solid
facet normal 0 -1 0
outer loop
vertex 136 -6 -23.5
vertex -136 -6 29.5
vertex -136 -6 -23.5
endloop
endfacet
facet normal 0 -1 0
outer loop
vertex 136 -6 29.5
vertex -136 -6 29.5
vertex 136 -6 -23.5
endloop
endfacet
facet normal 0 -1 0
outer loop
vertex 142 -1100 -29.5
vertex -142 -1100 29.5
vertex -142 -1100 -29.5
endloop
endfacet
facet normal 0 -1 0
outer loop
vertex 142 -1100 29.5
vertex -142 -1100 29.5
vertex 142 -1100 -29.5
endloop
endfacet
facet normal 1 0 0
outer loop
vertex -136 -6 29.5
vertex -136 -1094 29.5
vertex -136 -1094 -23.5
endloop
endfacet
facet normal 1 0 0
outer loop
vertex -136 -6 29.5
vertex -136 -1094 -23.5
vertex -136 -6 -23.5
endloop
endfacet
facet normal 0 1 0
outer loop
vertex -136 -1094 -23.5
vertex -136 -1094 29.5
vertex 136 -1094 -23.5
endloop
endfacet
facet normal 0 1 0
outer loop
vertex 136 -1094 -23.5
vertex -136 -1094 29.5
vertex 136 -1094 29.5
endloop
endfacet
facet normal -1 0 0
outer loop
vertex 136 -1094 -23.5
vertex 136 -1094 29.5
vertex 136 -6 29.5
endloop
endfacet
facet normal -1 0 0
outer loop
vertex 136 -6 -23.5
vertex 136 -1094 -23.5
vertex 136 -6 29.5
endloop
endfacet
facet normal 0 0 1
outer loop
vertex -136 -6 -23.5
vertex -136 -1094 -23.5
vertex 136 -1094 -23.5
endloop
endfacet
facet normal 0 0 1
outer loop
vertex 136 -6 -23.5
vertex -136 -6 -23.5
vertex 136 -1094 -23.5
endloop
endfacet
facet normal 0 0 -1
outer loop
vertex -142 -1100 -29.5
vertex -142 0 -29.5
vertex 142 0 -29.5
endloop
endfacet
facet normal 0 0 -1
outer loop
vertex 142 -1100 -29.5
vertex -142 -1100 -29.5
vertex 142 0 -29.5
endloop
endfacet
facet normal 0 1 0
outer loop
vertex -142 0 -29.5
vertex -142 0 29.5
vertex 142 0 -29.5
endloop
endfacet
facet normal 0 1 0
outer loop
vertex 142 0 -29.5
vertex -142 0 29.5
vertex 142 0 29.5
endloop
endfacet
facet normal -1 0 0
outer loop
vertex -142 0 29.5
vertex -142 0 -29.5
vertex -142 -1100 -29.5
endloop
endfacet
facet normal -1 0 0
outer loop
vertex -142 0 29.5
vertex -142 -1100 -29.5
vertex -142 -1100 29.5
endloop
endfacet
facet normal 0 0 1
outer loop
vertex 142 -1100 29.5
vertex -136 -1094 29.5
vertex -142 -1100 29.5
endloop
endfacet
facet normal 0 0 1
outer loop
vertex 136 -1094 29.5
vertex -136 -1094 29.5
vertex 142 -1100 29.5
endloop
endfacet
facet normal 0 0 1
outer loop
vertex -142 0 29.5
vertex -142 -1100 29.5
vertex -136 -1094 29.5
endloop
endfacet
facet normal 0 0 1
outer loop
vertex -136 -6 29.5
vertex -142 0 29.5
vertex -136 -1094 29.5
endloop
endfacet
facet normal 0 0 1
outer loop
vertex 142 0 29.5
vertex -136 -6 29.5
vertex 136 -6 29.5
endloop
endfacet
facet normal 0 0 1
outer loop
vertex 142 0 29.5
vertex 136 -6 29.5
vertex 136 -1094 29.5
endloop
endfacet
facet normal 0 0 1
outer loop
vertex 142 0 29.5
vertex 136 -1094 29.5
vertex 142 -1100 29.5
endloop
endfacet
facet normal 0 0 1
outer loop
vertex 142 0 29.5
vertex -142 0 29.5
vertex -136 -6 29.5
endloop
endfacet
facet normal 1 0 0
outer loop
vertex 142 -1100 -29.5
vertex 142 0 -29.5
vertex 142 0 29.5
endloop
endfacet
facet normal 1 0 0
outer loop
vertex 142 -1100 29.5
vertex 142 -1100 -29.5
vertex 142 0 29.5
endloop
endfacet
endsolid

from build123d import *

# Parameters (mm, degrees)
F0_W     = 284
F0_H     = 59
F1_DEPTH = 1100
F3_DEPTH = 59
F4_W     = 272
F4_H     = 1088
F5_DEPTH = 53


with BuildPart() as f1:
    # F0 (on Front) → F1 (new body)
    with BuildSketch(Plane.XZ):
        Rectangle(F0_W, F0_H)
    extrude(amount=F1_DEPTH)

    # F2 (on face) → F3 (cut)
    with BuildSketch(Plane.XY.offset(29.5)):
        Polygon((148, 6), (-136, 6), (-136, 0), (142, 0), (142, -1094), (148, -1094), align=None)
    extrude(amount=-F3_DEPTH, mode=Mode.SUBTRACT)

    # F4 (on face) → F5 (cut)
    with BuildSketch(Plane.XY.offset(29.5)):
        with Locations((0, -550)):
            Rectangle(F4_W, F4_H)
    extrude(amount=-F5_DEPTH, mode=Mode.SUBTRACT)


solid = f1.part
